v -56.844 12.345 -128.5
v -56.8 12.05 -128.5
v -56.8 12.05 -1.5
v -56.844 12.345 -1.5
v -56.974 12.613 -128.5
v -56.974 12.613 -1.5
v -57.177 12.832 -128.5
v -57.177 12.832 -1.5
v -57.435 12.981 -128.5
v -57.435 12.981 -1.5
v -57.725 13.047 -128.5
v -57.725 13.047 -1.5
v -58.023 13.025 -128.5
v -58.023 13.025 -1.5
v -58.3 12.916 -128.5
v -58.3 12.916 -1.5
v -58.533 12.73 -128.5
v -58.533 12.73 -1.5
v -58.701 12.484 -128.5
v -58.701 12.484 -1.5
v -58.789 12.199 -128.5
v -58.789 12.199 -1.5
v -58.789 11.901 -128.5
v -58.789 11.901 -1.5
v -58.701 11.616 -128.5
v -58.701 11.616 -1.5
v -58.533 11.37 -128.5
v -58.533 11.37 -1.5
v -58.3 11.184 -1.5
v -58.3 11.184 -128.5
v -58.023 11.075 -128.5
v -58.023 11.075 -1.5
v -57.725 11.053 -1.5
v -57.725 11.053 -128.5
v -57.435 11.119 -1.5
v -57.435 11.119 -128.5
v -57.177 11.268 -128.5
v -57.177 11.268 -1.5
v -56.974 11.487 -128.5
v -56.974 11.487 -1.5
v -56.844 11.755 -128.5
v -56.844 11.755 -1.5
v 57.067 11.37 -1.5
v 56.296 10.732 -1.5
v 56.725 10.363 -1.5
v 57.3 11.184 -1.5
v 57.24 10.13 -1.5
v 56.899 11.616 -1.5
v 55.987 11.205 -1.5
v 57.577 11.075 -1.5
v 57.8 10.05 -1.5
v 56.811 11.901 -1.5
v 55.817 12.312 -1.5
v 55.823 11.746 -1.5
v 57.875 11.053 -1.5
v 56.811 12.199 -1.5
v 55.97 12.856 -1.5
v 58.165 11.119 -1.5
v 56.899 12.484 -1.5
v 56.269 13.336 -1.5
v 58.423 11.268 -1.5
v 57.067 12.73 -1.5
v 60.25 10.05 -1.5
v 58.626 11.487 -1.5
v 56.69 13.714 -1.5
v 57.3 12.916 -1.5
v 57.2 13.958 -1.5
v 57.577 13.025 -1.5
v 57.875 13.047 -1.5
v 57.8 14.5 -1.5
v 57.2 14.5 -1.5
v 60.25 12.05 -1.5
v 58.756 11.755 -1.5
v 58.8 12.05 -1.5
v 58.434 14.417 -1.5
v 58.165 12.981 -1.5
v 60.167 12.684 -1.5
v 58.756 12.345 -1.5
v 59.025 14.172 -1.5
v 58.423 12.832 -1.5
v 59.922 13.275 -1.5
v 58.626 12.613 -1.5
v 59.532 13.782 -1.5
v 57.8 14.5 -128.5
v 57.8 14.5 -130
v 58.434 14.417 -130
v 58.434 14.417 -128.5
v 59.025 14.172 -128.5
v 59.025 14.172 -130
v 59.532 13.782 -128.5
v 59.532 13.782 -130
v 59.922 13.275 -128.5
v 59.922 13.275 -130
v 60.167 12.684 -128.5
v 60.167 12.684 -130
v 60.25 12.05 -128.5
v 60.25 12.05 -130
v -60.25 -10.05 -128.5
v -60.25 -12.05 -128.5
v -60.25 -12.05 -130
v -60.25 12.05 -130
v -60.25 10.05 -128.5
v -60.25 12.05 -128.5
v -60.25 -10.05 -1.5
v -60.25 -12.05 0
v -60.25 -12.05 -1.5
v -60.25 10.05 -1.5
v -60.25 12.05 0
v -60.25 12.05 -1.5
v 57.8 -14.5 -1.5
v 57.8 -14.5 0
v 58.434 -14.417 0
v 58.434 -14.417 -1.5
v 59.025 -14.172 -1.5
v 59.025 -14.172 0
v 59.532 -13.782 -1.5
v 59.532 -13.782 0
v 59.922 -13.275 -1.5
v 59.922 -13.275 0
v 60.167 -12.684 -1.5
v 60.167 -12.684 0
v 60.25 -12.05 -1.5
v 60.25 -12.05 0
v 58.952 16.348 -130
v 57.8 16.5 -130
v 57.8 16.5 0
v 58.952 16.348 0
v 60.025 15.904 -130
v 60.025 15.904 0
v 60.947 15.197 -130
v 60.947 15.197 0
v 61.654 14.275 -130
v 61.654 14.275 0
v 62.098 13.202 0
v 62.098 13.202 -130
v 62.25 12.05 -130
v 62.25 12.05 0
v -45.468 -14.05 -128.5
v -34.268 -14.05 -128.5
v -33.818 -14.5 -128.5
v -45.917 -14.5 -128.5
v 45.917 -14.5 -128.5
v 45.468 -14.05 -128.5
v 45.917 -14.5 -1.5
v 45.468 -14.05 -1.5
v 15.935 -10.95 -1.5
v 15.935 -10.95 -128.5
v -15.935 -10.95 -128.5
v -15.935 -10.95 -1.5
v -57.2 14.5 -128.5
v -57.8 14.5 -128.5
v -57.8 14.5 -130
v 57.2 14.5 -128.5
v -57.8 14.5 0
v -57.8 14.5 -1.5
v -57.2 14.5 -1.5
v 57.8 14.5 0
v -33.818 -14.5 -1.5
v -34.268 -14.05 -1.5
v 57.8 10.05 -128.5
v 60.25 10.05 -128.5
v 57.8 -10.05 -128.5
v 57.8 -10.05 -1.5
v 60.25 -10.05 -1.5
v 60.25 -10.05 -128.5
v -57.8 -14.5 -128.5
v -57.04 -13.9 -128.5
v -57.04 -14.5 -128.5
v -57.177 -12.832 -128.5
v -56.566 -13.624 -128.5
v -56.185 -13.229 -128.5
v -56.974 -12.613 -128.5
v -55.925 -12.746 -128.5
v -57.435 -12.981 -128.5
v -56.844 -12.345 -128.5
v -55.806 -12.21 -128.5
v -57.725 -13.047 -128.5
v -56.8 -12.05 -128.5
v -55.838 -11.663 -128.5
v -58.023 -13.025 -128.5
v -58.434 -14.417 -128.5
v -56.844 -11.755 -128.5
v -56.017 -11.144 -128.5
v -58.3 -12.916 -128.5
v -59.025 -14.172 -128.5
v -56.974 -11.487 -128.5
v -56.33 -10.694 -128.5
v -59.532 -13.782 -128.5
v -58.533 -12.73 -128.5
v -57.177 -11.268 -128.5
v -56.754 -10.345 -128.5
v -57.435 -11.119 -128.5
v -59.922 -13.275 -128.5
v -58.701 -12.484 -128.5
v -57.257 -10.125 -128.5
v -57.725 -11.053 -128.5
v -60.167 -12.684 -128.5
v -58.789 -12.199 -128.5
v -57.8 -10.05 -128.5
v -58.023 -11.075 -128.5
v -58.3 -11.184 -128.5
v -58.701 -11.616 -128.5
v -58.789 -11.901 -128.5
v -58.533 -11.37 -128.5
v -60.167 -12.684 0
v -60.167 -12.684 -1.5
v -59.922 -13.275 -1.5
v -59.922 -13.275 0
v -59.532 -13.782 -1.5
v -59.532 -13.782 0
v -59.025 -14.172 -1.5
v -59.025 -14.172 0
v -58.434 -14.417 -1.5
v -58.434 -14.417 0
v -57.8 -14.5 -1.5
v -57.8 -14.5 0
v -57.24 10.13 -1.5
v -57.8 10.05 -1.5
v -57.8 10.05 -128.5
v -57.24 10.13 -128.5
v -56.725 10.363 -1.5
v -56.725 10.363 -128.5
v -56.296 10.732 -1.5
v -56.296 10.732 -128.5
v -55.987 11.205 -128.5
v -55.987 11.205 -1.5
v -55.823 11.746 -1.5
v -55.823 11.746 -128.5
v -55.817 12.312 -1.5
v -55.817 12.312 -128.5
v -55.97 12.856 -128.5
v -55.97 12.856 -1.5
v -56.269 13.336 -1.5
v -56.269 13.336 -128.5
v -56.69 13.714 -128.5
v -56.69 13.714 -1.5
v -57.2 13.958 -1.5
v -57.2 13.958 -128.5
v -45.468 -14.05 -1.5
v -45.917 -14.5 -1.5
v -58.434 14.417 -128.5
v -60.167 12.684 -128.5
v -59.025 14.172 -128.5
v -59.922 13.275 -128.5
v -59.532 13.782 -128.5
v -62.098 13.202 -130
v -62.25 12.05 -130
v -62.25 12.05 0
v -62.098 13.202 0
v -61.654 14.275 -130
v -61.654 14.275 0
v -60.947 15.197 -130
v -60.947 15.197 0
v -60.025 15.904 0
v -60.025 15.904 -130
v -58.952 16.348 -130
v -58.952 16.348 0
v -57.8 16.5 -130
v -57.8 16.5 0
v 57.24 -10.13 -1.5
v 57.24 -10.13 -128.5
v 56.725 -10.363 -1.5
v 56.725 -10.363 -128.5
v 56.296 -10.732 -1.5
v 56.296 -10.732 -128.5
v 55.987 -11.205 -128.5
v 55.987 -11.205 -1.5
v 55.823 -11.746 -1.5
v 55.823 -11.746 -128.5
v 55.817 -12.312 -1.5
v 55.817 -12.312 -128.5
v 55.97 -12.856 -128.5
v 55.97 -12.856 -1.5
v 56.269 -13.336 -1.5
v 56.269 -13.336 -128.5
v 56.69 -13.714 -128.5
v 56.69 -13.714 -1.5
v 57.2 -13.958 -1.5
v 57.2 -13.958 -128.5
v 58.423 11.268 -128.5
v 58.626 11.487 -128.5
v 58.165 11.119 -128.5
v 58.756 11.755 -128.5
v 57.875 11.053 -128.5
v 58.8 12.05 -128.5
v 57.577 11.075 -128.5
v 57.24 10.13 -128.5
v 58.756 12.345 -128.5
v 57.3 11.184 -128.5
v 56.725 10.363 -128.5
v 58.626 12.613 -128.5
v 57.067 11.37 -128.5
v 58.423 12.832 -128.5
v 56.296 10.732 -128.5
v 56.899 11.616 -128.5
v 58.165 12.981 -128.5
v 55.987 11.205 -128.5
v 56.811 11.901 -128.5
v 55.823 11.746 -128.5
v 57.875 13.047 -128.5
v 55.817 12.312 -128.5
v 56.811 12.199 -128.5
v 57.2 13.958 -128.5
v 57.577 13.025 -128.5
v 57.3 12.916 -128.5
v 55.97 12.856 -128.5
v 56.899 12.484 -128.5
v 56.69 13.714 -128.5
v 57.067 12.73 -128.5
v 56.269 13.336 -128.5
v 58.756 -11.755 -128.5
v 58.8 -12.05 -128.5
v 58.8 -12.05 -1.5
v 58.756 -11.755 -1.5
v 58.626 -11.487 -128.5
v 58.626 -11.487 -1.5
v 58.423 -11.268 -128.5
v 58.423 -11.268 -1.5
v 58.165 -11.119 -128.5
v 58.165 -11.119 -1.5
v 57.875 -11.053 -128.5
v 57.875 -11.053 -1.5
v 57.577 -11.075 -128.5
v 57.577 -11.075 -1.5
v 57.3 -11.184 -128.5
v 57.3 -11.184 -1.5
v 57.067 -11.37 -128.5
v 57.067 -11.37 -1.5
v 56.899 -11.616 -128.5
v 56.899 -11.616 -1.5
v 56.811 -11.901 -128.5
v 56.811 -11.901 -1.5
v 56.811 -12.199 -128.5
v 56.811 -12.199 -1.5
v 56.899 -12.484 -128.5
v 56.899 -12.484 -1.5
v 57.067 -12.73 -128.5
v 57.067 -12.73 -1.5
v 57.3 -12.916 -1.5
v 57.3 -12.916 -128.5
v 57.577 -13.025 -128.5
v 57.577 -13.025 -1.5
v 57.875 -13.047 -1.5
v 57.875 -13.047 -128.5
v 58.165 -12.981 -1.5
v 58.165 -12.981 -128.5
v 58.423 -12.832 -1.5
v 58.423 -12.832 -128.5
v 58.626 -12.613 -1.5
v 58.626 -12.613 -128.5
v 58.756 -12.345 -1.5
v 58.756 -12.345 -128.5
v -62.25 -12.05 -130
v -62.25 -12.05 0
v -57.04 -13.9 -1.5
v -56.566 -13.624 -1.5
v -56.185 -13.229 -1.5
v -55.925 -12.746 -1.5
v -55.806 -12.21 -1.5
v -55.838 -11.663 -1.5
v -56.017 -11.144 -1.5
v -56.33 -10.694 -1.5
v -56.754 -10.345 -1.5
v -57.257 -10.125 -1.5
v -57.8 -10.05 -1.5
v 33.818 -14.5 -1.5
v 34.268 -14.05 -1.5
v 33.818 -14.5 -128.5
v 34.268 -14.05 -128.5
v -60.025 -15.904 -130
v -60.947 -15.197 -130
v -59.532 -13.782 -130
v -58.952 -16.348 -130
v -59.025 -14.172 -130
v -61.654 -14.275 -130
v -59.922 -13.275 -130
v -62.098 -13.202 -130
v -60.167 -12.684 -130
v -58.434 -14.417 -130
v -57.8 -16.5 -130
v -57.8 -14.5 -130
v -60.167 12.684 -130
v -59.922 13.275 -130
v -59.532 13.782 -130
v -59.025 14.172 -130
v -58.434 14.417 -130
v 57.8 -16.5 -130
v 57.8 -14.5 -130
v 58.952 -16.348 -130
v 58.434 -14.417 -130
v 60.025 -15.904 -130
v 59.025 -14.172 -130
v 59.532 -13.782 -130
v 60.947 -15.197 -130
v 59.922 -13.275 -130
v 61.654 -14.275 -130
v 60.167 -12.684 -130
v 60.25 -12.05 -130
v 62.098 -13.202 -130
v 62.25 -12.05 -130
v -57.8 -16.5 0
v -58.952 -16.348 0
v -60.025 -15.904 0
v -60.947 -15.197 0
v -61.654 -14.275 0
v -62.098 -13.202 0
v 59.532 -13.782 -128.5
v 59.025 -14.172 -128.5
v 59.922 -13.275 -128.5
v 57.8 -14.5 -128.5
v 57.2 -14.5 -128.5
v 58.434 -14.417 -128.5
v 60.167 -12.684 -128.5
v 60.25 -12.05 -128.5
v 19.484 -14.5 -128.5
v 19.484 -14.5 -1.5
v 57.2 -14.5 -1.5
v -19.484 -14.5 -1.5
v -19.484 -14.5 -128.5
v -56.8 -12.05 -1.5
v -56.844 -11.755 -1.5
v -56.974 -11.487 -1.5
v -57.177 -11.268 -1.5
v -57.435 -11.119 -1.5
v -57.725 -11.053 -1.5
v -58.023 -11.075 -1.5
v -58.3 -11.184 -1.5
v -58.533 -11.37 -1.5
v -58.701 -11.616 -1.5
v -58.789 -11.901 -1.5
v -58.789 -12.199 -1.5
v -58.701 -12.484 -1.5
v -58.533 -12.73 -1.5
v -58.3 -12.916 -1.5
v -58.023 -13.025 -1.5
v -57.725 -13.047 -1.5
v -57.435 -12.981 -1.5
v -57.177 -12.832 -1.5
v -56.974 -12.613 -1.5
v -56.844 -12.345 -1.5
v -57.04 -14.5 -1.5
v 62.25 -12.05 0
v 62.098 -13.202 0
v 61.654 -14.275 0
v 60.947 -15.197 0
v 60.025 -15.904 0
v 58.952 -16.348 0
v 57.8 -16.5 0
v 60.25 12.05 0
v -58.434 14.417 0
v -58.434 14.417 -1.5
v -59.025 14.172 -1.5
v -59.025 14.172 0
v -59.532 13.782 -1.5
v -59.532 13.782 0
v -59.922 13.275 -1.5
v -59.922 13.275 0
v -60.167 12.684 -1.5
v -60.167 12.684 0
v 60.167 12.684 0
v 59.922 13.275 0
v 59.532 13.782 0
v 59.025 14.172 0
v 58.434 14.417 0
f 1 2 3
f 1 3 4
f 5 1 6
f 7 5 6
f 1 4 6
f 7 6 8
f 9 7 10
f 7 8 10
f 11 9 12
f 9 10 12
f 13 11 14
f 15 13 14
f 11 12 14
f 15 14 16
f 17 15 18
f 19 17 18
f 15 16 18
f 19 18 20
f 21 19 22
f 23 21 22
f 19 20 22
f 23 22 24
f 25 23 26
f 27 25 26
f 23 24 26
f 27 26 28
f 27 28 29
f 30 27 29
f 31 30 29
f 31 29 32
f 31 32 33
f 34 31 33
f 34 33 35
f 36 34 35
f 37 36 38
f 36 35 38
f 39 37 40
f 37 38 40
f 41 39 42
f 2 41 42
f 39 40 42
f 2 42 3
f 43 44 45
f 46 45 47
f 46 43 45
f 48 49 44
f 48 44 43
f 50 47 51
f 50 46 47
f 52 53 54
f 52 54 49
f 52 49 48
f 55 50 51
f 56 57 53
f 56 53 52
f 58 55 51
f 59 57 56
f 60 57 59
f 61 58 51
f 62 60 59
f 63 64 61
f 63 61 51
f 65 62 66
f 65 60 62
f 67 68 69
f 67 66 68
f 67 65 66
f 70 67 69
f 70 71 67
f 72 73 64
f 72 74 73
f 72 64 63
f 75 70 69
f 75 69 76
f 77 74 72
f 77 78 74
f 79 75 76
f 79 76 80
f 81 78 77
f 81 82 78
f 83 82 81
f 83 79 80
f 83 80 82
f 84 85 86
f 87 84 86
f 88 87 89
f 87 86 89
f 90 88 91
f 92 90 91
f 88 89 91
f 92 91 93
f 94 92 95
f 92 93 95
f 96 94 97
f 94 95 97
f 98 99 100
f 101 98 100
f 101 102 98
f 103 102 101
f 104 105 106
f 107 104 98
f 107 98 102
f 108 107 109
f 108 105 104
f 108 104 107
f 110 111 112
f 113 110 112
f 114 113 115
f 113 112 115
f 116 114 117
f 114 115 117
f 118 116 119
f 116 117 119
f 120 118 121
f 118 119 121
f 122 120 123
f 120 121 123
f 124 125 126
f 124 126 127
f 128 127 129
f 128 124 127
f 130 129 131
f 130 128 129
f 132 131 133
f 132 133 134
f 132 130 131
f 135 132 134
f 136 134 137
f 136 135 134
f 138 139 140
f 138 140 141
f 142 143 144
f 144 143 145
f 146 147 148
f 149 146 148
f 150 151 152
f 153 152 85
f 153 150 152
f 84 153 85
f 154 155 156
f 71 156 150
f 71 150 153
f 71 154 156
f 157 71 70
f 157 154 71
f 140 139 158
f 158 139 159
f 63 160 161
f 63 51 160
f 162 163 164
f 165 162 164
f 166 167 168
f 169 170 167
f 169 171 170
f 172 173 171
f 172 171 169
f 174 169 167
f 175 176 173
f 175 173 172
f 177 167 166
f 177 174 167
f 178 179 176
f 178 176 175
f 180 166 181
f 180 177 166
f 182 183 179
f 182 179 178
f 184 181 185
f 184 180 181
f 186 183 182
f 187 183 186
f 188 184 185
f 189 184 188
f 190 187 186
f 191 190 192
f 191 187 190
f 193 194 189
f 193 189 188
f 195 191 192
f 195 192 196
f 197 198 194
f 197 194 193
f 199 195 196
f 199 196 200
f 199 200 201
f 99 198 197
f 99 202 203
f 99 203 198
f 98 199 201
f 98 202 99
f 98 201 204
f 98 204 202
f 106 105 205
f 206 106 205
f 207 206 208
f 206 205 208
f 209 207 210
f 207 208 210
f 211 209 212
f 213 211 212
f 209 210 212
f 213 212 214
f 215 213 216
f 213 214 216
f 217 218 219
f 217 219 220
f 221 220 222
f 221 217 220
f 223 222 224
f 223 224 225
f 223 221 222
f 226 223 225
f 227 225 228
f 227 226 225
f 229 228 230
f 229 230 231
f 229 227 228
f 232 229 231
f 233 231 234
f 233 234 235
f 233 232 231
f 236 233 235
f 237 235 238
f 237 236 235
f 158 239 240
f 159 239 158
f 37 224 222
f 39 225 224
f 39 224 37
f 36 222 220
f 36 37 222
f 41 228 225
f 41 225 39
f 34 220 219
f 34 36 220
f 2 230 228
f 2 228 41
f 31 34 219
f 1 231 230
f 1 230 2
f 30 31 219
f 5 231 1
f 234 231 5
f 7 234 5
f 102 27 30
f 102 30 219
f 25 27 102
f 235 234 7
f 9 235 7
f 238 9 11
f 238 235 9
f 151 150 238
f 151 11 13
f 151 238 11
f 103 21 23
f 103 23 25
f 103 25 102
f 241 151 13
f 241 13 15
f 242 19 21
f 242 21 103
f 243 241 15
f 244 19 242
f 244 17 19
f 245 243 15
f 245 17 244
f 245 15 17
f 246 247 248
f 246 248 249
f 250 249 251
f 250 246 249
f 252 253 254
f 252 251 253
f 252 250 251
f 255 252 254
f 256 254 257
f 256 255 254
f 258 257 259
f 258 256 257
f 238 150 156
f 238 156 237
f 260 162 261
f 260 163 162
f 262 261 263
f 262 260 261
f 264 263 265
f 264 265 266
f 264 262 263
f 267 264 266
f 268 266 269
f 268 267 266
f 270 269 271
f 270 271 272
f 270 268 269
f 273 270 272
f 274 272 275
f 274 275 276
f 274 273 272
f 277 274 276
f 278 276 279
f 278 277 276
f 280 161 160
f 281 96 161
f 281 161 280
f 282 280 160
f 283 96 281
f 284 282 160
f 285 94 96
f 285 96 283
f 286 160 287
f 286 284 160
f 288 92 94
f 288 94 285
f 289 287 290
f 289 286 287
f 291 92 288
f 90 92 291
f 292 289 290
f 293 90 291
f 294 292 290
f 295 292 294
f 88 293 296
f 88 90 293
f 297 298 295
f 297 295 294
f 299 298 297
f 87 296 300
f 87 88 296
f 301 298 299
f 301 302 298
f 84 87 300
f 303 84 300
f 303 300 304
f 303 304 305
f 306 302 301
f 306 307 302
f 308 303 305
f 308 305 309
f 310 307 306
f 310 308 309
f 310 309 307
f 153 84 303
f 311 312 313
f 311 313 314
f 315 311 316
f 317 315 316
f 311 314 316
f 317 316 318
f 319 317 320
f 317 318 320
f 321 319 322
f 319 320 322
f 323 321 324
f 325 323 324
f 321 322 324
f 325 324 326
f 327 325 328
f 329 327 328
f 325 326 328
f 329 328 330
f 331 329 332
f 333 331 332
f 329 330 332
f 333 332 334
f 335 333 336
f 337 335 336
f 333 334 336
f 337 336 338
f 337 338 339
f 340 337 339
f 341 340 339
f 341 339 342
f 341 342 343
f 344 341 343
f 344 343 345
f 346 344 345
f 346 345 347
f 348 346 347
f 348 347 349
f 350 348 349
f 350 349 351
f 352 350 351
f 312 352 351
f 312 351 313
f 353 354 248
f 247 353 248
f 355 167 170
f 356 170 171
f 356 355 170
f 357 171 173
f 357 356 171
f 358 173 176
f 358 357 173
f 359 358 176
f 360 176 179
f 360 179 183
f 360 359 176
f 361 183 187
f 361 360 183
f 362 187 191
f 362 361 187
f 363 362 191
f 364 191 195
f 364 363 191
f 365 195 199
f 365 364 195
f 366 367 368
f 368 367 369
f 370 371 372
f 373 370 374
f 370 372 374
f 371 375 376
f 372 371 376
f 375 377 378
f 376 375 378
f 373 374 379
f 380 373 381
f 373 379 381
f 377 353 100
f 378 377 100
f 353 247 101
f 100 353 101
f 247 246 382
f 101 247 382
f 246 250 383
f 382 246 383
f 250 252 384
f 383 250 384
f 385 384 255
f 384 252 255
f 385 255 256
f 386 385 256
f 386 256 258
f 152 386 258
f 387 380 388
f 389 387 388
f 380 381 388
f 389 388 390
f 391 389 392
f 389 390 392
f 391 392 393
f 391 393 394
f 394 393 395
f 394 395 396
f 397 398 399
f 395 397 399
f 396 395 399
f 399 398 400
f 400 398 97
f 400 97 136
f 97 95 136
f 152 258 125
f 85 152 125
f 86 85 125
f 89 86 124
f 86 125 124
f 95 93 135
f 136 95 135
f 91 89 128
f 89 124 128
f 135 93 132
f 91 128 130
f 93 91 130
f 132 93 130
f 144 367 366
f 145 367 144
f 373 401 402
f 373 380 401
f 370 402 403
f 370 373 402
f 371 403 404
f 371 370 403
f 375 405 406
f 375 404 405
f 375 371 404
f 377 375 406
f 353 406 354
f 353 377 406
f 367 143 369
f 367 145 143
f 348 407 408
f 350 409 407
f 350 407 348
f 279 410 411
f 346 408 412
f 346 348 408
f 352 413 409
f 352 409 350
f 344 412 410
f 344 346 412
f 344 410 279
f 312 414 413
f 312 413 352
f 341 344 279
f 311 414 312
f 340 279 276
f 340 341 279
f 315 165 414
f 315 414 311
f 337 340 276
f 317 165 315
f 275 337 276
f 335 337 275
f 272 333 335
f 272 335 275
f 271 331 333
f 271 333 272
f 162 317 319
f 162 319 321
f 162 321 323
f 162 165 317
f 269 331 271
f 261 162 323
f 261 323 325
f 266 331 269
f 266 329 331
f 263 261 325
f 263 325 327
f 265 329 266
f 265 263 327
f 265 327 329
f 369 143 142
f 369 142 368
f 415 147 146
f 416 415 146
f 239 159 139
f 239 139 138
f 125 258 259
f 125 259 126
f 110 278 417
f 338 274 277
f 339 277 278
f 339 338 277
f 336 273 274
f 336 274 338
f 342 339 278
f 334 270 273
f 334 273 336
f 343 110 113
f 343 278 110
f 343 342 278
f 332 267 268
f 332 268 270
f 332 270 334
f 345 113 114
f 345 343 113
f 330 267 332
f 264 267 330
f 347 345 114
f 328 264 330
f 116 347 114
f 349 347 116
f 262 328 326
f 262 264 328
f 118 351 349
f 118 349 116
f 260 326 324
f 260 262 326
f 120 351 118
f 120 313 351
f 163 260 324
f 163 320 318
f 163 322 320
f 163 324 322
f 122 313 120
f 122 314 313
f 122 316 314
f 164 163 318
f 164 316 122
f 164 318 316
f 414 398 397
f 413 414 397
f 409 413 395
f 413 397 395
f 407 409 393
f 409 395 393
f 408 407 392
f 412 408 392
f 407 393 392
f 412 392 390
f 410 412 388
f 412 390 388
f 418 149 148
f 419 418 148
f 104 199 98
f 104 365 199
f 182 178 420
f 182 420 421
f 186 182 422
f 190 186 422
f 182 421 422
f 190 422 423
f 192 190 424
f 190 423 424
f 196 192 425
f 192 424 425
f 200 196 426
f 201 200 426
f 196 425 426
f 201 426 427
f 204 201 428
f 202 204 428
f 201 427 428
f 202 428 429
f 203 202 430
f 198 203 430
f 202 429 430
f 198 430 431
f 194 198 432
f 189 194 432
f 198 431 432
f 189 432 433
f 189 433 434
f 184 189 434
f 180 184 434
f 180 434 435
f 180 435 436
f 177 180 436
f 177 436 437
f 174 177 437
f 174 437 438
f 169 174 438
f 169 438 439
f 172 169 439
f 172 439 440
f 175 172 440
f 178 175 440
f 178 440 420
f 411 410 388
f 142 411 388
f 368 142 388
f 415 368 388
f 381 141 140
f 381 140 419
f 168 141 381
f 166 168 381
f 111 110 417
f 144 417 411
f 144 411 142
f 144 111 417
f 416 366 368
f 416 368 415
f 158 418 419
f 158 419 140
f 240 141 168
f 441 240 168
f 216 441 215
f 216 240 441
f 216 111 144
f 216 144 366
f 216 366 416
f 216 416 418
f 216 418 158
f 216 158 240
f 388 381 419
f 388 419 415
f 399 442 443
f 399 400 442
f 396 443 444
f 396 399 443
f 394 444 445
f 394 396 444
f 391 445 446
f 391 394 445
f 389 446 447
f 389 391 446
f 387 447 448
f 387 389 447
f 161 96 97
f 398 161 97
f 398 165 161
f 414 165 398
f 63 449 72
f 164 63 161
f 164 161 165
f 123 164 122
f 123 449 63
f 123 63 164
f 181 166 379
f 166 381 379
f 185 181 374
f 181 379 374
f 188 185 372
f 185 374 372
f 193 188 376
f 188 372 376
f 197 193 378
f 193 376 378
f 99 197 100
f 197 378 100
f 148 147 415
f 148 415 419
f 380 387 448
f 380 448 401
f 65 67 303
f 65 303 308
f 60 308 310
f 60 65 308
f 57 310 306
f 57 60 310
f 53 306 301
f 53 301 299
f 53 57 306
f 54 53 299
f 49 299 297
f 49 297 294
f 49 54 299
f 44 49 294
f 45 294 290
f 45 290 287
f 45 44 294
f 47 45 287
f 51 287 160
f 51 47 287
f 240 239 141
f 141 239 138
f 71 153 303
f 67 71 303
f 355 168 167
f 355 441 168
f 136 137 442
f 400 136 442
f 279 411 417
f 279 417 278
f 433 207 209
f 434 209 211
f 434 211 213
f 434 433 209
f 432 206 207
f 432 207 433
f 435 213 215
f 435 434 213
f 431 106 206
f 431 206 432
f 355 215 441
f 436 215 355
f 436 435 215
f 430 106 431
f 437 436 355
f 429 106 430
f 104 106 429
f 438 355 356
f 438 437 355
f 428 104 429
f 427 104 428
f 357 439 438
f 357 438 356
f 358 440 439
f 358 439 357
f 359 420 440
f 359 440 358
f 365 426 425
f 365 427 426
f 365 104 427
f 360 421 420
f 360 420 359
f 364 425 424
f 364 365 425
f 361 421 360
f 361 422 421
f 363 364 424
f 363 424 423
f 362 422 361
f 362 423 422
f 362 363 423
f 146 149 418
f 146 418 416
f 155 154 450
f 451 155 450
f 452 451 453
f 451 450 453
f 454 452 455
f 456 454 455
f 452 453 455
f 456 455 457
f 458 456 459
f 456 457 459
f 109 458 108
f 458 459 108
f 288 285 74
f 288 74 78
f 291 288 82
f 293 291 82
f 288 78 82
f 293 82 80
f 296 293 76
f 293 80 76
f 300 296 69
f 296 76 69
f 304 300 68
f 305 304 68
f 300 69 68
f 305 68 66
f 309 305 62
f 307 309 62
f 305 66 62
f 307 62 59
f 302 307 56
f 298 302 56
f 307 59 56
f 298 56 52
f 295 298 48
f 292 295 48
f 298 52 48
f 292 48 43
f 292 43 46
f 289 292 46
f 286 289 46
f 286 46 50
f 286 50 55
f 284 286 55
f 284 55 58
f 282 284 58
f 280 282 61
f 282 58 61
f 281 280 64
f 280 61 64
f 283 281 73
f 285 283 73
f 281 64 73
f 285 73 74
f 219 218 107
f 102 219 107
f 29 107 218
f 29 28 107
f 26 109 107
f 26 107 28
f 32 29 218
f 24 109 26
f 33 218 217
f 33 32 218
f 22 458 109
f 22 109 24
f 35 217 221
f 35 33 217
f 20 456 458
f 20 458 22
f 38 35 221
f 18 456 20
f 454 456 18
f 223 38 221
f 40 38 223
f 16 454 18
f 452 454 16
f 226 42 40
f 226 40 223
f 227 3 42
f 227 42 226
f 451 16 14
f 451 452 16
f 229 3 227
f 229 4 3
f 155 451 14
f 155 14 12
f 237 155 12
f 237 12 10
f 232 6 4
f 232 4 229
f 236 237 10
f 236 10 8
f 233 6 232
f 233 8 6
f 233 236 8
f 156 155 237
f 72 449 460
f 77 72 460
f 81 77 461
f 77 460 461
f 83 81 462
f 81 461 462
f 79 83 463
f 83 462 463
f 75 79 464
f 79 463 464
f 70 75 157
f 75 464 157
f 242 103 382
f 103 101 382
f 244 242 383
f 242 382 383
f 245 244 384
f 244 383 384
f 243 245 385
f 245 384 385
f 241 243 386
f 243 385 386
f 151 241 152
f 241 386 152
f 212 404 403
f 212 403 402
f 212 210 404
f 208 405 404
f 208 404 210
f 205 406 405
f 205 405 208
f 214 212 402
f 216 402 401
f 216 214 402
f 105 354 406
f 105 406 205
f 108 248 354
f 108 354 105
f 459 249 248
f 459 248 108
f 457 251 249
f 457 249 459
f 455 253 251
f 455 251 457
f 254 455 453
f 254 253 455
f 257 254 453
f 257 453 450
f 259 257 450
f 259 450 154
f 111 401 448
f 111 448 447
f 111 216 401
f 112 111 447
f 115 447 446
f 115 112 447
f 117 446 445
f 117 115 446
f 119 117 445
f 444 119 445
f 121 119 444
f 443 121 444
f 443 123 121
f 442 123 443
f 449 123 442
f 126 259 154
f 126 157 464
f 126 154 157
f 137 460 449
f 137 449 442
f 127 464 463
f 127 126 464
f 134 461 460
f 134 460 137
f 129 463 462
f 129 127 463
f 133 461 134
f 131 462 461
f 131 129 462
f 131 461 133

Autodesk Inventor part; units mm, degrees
ref_plane "YZ Plane" through (0, 0, 0) normal (1, 0, 0) x (0, 1, 0)
ref_plane "XZ Plane" through (0, 0, 0) normal (0, 1, 0) x (-1, 0, 0)
ref_plane "XY Plane" through (0, 0, 0) normal (0, 0, 1) x (1, 0, 0)
sketch "Sketch1" plane through (0, 0, 0) normal (0, 0, 1) x (1, 0, 0)
  line L0 (-62.25, 16.5) -> (62.25, 16.5)
  line L1 (62.25, 16.5) -> (62.25, -16.5)
  line L2 (62.25, -16.5) -> (-62.25, -16.5)
  line L3 (-62.25, -16.5) -> (-62.25, 16.5)
  line L4 (-60.25, 14.5) -> (60.25, 14.5)
  line L5 (60.25, 14.5) -> (60.25, -14.5)
  line L6 (60.25, -14.5) -> (-60.25, -14.5)
  line L7 (-60.25, -14.5) -> (-60.25, 14.5)
  point P0 (0, 0)
  dimension "d0" = 124.5
  dimension "d1" = 62.25
  dimension "d2" = 120.5
  dimension "d3" = 60.25
  dimension "d4" = 33
  dimension "d5" = 29
  dimension "d6" = 16.5
  dimension "d7" = 14.5
extrude "Extrusion1" add sketch "Sketch1" against normal blind 130
sketch "Sketch2" plane through (0, 0, 0) normal (0, 0, 1) x (1, 0, 0)
  line L0 (60.25, -14.5) -> (-60.25, -14.5) projected
  line L1 (-15.935, -14.5) -> (15.935, -14.5)
  line L2 (15.935, -14.5) -> (15.935, -10.95)
  line L3 (15.935, -10.95) -> (-15.935, -10.95)
  line L4 (-15.935, -10.95) -> (-15.935, -14.5)
  point P0 (0, 0)
  dimension "d10" = 31.87
  dimension "d11" = 15.935
  dimension "d12" = 3.55
extrude "Extrusion2" add sketch "Sketch2" against normal blind 130
chamfer "Chamfer1" distance 3.55 angle 45 2 edges at (15.935, -14.5, -65) (-15.935, -14.5, -65)
sketch "Sketch3" plane through (0, 0, 0) normal (0, 0, 1) x (1, 0, 0)
  line L0 (-19.485, -14.5) -> (-60.25, -14.5) projected
  line L1 (-45.4675, -14.5) -> (-34.2675, -14.5)
  line L2 (-34.2675, -14.5) -> (-34.2675, -14.05)
  line L3 (-34.2675, -14.05) -> (-45.4675, -14.05)
  line L4 (-45.4675, -14.05) -> (-45.4675, -14.5)
  line L5 (-60.25, 14.5) -> (-60.25, -14.5) projected
  point P0 (0, 0)
  point P1 (-60.25, -14.5)
  dimension "d18" = 40.765
  dimension "d19" = 11.2
  dimension "d20" = 0.45
  dimension "d21" = 14.7825
  dimension "d22" = 14.7825
extrude "Extrusion3" add sketch "Sketch3" against normal blind 130
chamfer "Chamfer2" distance 0.45 angle 45 2 edges at (-45.4675, -14.5, -65) (-34.2675, -14.5, -65)
sketch "Sketch4" plane through (0, 0, 0) normal (0, 0, 1) x (1, 0, 0)
  line L0 (60.25, -14.5) -> (19.485, -14.5) projected
  line L1 (34.2675, -14.5) -> (45.4675, -14.5)
  line L2 (45.4675, -14.5) -> (45.4675, -14.05)
  line L3 (45.4675, -14.05) -> (34.2675, -14.05)
  line L4 (34.2675, -14.05) -> (34.2675, -14.5)
  point P0 (0, 0)
  dimension "d28" = 11.2
  dimension "d29" = 0.45
  dimension "d30" = 14.7825
extrude "Extrusion4" add sketch "Sketch4" against normal blind 130
chamfer "Chamfer3" distance 0.45 angle 45 2 edges at (34.2675, -14.5, -65) (45.4675, -14.5, -65)
sketch "Sketch5" plane through (0, 0, 0) normal (0, 0, 1) x (1, 0, 0)
  circle A0 centre (-57.8, 12.05) radius 2
  circle A1 centre (57.8, 12.05) radius 2
  line L0 (62.25, -16.5) -> (62.25, 16.5) projected
  line L1 (62.25, 16.5) -> (-62.25, 16.5) projected
  line L2 (-62.25, 16.5) -> (-62.25, -16.5) projected
  line L3 (-60.25, 14.5) -> (-60.25, -14.5) projected
  line L4 (-57.8, 10.05) -> (-60.25, 10.05)
  line L5 (-60.25, 10.05) -> (-60.25, 14.5)
  line L6 (-60.25, 14.5) -> (-57.8, 14.5)
  line L7 (-57.8, 14.5) -> (-57.8, 10.05)
  line L8 (-57.8, 14.5) -> (-57.2, 14.5)
  line L9 (-57.2, 14.5) -> (-57.2, 13.9579)
  line L10 (-57.2, 13.9579) -> (-57.8, 13.9579)
  line L11 (-57.8, 13.9579) -> (-57.8, 14.5)
  line L12 (60.25, 14.5) -> (-60.25, 14.5) projected
  line L13 (60.25, 14.5) -> (57.8, 14.5)
  line L14 (57.8, 14.5) -> (57.8, 10.05)
  line L15 (57.8, 10.05) -> (60.25, 10.05)
  line L16 (60.25, 10.05) -> (60.25, 14.5)
  line L17 (57.8, 14.5) -> (57.2, 14.5)
  line L18 (57.2, 14.5) -> (57.2, 13.9579)
  line L19 (57.2, 13.9579) -> (57.8, 13.9579)
  line L20 (57.8, 13.9579) -> (57.8, 14.5)
  circle A2 centre (-57.8, -12.05) radius 2
  circle A3 centre (57.8, -12.05) radius 2
  line L21 (-62.25, -16.5) -> (62.25, -16.5) projected
  line L22 (-57.8, -10.05) -> (-60.25, -10.05)
  line L23 (-60.25, -10.05) -> (-60.25, -14.5)
  line L24 (-60.25, -14.5) -> (-57.8, -14.5)
  line L25 (-57.8, -14.5) -> (-57.8, -10.05)
  line L26 (60.25, 14.5) -> (60.25, -14.5) projected
  line L27 (57.8, -10.05) -> (60.25, -10.05)
  line L28 (60.25, -10.05) -> (60.25, -14.5)
  line L29 (60.25, -14.5) -> (57.8, -14.5)
  line L30 (57.8, -14.5) -> (57.8, -10.05)
  line L31 (57.2, -13.9579) -> (57.8, -13.9579)
  line L32 (57.8, -13.9579) -> (57.8, -14.5)
  line L33 (57.8, -14.5) -> (57.2, -14.5)
  line L34 (57.2, -14.5) -> (57.2, -13.9579)
  line L35 (-57.8, -14.5) -> (-57.0401, -14.5)
  line L36 (-57.0401, -14.5) -> (-57.0401, -13.9)
  line L37 (-57.0401, -13.9) -> (-57.8, -13.9)
  line L38 (-57.8, -13.9) -> (-57.8, -14.5)
  point P0 (0, 0)
  point P1 (-55.8, 12.05)
  point P2 (55.8, 12.05)
  dimension "d36" = 115.6
  dimension "d37" = 4.45
  dimension "d38" = 4.45
  dimension "d39" = 4.45
  dimension "d40" = 4.45
  dimension "d41" = 111.6
  dimension "d42" = 4
  dimension "d43" = 4
  dimension "d44" = 0.6
  dimension "d45" = 4.45
  dimension "d46" = 4.45
  dimension "d47" = 0.6
  dimension "d48" = 4
  dimension "d49" = 4.45
  dimension "d50" = 4.45
  dimension "d51" = 4.45
  dimension "d52" = 4.45
  dimension "d53" = 0.6
  dimension "d54" = 4.45
  dimension "d55" = 4
  dimension "d56" = 0.6
extrude "Extrusion5" add sketch "Sketch5" against normal blind 130 contours A0 L7 L10 | L22 A2 L25 L24 L3 | L26 L29 L30 A3 L27 | L12 L14 A1 L18 | L10 L7 A0 | A0 L7 L8 L9 | L4 L3 L6 L7 A0 | A0 L7 | L12 L16 L15 A1 L14 | L19 L14 A1 | A1 L14 L19 | L25 A2 | A2 L37 L25 | A1 L14 | L25 A2 L36 L35 | L25 L37 A2 | L30 L31 A3 | A3 L30 | L33 L34 A3 L30 | L31 L30 A3
sketch "Sketch6" plane through (0, 0, 0) normal (0, 0, 1) x (1, 0, 0)
  arc A0 (-57.8, 10.05) -> (-57.2, 13.9579) centre (-57.8, 12.05) ccw projected
  arc A1 (-57.0401, -13.9) -> (-57.8, -10.05) centre (-57.8, -12.05) ccw projected
  arc A2 (57.8, -10.05) -> (57.2, -13.9579) centre (57.8, -12.05) ccw projected
  arc A3 (57.2, 13.9579) -> (57.8, 10.05) centre (57.8, 12.05) ccw projected
  circle A4 centre (-57.8, 12.05) radius 1
  circle A5 centre (-57.8, -12.05) radius 1
  circle A6 centre (57.8, -12.05) radius 1
  circle A7 centre (57.8, 12.05) radius 1
  point P0 (0, 0)
  dimension "d59" = 2
  dimension "d60" = 2
  dimension "d61" = 2
  dimension "d62" = 2
extrude "Extrusion6" cut sketch "Sketch6" against normal blind 130
fillet "Fillet1" radius 4.45 4 edges at (-62.25, 16.5, -65) (-62.25, -16.5, -65) (62.25, -16.5, -65) (62.25, 16.5, -65)
sketch "Sketch7" plane through (0, 0, 0) normal (0, 0, 1) x (1, 0, 0)
  line L0 (-60.25, 14.5) -> (60.25, 14.5)
  line L1 (60.25, 14.5) -> (60.25, -14.5)
  line L2 (60.25, -14.5) -> (-60.25, -14.5)
  line L3 (-60.25, -14.5) -> (-60.25, 14.5)
  line L4 (-57.2, 14.5) -> (57.2, 14.5) projected
  line L5 (60.25, 10.05) -> (60.25, -10.05) projected
  line L6 (33.8175, -14.5) -> (19.485, -14.5) projected
  line L7 (-60.25, -10.05) -> (-60.25, 10.05) projected
  arc A0 (-57.8, 10.05) -> (-57.2, 13.9579) centre (-57.8, 12.05) ccw projected
  circle A1 centre (-57.8, 12.05) radius 2.45
  arc A2 (-57.0401, -13.9) -> (-57.8, -10.05) centre (-57.8, -12.05) ccw projected
  circle A3 centre (-57.8, -12.05) radius 2.45
  circle A4 centre (57.8, -12.05) radius 1 projected
  circle A5 centre (57.8, -12.05) radius 2.45
  circle A6 centre (57.8, 12.05) radius 1 projected
  circle A7 centre (57.8, 12.05) radius 2.45
  point P0 (0, 0)
  point P1 (57.8, 14.5)
  point P2 (-57.8, 14.5)
  point P3 (-60.25, 12.05)
  point P4 (-60.25, -12.05)
  point P5 (-57.8, -14.5)
  point P6 (57.8, -14.5)
  point P7 (60.25, -12.05)
  point P8 (60.25, 12.05)
extrude "Extrusion7" cut sketch "Sketch7" against normal blind 1.5 contours L0 A7 L1 A5 L2 A3 L3 A1 | A1 | A7 | A3 | A5 | A4 | A6
sketch "Sketch8" plane through (0, 0, -130) normal (0, 0, -1) x (-1, 0, 0)
  line L0 (-60.25, 14.5) -> (60.25, 14.5)
  line L1 (60.25, 14.5) -> (60.25, -14.5)
  line L2 (60.25, -14.5) -> (-60.25, -14.5)
  line L3 (-60.25, -14.5) -> (-60.25, 14.5)
  line L4 (-57.2, 14.5) -> (57.2, 14.5) projected
  line L5 (60.25, 10.05) -> (60.25, -10.05) projected
  line L6 (33.8175, -14.5) -> (19.485, -14.5) projected
  line L7 (-60.25, -10.05) -> (-60.25, 10.05) projected
  circle A0 centre (-57.8, 12.05) radius 1 projected
  circle A1 centre (-57.8, 12.05) radius 2.45
  line L8 (57.8, 14.5) -> (-57.8, 14.5) projected
  circle A2 centre (-57.8, -12.05) radius 1 projected
  circle A3 centre (-57.8, -12.05) radius 2.45
  circle A4 centre (57.8, -12.05) radius 1 projected
  line L9 (-57.8, -14.5) -> (57.8, -14.5) projected
  circle A5 centre (57.8, -12.05) radius 2.45
  circle A6 centre (57.8, 12.05) radius 1 projected
  circle A7 centre (57.8, 12.05) radius 2.45
  point P0 (0, 0)
  point P1 (-60.25, 12.05)
  point P2 (-60.25, -12.05)
  point P3 (-57.8, -14.5)
  point P4 (60.25, -12.05)
  point P5 (60.25, 12.05)
extrude "Extrusion8" cut sketch "Sketch8" against normal blind 1.5 contours L0 A7 L1 A5 L2 A3 L3 A1 | A1 | A7 | A3 | A5 | A0 | A2 | A4 | A6
properties part number "case_dummy"
